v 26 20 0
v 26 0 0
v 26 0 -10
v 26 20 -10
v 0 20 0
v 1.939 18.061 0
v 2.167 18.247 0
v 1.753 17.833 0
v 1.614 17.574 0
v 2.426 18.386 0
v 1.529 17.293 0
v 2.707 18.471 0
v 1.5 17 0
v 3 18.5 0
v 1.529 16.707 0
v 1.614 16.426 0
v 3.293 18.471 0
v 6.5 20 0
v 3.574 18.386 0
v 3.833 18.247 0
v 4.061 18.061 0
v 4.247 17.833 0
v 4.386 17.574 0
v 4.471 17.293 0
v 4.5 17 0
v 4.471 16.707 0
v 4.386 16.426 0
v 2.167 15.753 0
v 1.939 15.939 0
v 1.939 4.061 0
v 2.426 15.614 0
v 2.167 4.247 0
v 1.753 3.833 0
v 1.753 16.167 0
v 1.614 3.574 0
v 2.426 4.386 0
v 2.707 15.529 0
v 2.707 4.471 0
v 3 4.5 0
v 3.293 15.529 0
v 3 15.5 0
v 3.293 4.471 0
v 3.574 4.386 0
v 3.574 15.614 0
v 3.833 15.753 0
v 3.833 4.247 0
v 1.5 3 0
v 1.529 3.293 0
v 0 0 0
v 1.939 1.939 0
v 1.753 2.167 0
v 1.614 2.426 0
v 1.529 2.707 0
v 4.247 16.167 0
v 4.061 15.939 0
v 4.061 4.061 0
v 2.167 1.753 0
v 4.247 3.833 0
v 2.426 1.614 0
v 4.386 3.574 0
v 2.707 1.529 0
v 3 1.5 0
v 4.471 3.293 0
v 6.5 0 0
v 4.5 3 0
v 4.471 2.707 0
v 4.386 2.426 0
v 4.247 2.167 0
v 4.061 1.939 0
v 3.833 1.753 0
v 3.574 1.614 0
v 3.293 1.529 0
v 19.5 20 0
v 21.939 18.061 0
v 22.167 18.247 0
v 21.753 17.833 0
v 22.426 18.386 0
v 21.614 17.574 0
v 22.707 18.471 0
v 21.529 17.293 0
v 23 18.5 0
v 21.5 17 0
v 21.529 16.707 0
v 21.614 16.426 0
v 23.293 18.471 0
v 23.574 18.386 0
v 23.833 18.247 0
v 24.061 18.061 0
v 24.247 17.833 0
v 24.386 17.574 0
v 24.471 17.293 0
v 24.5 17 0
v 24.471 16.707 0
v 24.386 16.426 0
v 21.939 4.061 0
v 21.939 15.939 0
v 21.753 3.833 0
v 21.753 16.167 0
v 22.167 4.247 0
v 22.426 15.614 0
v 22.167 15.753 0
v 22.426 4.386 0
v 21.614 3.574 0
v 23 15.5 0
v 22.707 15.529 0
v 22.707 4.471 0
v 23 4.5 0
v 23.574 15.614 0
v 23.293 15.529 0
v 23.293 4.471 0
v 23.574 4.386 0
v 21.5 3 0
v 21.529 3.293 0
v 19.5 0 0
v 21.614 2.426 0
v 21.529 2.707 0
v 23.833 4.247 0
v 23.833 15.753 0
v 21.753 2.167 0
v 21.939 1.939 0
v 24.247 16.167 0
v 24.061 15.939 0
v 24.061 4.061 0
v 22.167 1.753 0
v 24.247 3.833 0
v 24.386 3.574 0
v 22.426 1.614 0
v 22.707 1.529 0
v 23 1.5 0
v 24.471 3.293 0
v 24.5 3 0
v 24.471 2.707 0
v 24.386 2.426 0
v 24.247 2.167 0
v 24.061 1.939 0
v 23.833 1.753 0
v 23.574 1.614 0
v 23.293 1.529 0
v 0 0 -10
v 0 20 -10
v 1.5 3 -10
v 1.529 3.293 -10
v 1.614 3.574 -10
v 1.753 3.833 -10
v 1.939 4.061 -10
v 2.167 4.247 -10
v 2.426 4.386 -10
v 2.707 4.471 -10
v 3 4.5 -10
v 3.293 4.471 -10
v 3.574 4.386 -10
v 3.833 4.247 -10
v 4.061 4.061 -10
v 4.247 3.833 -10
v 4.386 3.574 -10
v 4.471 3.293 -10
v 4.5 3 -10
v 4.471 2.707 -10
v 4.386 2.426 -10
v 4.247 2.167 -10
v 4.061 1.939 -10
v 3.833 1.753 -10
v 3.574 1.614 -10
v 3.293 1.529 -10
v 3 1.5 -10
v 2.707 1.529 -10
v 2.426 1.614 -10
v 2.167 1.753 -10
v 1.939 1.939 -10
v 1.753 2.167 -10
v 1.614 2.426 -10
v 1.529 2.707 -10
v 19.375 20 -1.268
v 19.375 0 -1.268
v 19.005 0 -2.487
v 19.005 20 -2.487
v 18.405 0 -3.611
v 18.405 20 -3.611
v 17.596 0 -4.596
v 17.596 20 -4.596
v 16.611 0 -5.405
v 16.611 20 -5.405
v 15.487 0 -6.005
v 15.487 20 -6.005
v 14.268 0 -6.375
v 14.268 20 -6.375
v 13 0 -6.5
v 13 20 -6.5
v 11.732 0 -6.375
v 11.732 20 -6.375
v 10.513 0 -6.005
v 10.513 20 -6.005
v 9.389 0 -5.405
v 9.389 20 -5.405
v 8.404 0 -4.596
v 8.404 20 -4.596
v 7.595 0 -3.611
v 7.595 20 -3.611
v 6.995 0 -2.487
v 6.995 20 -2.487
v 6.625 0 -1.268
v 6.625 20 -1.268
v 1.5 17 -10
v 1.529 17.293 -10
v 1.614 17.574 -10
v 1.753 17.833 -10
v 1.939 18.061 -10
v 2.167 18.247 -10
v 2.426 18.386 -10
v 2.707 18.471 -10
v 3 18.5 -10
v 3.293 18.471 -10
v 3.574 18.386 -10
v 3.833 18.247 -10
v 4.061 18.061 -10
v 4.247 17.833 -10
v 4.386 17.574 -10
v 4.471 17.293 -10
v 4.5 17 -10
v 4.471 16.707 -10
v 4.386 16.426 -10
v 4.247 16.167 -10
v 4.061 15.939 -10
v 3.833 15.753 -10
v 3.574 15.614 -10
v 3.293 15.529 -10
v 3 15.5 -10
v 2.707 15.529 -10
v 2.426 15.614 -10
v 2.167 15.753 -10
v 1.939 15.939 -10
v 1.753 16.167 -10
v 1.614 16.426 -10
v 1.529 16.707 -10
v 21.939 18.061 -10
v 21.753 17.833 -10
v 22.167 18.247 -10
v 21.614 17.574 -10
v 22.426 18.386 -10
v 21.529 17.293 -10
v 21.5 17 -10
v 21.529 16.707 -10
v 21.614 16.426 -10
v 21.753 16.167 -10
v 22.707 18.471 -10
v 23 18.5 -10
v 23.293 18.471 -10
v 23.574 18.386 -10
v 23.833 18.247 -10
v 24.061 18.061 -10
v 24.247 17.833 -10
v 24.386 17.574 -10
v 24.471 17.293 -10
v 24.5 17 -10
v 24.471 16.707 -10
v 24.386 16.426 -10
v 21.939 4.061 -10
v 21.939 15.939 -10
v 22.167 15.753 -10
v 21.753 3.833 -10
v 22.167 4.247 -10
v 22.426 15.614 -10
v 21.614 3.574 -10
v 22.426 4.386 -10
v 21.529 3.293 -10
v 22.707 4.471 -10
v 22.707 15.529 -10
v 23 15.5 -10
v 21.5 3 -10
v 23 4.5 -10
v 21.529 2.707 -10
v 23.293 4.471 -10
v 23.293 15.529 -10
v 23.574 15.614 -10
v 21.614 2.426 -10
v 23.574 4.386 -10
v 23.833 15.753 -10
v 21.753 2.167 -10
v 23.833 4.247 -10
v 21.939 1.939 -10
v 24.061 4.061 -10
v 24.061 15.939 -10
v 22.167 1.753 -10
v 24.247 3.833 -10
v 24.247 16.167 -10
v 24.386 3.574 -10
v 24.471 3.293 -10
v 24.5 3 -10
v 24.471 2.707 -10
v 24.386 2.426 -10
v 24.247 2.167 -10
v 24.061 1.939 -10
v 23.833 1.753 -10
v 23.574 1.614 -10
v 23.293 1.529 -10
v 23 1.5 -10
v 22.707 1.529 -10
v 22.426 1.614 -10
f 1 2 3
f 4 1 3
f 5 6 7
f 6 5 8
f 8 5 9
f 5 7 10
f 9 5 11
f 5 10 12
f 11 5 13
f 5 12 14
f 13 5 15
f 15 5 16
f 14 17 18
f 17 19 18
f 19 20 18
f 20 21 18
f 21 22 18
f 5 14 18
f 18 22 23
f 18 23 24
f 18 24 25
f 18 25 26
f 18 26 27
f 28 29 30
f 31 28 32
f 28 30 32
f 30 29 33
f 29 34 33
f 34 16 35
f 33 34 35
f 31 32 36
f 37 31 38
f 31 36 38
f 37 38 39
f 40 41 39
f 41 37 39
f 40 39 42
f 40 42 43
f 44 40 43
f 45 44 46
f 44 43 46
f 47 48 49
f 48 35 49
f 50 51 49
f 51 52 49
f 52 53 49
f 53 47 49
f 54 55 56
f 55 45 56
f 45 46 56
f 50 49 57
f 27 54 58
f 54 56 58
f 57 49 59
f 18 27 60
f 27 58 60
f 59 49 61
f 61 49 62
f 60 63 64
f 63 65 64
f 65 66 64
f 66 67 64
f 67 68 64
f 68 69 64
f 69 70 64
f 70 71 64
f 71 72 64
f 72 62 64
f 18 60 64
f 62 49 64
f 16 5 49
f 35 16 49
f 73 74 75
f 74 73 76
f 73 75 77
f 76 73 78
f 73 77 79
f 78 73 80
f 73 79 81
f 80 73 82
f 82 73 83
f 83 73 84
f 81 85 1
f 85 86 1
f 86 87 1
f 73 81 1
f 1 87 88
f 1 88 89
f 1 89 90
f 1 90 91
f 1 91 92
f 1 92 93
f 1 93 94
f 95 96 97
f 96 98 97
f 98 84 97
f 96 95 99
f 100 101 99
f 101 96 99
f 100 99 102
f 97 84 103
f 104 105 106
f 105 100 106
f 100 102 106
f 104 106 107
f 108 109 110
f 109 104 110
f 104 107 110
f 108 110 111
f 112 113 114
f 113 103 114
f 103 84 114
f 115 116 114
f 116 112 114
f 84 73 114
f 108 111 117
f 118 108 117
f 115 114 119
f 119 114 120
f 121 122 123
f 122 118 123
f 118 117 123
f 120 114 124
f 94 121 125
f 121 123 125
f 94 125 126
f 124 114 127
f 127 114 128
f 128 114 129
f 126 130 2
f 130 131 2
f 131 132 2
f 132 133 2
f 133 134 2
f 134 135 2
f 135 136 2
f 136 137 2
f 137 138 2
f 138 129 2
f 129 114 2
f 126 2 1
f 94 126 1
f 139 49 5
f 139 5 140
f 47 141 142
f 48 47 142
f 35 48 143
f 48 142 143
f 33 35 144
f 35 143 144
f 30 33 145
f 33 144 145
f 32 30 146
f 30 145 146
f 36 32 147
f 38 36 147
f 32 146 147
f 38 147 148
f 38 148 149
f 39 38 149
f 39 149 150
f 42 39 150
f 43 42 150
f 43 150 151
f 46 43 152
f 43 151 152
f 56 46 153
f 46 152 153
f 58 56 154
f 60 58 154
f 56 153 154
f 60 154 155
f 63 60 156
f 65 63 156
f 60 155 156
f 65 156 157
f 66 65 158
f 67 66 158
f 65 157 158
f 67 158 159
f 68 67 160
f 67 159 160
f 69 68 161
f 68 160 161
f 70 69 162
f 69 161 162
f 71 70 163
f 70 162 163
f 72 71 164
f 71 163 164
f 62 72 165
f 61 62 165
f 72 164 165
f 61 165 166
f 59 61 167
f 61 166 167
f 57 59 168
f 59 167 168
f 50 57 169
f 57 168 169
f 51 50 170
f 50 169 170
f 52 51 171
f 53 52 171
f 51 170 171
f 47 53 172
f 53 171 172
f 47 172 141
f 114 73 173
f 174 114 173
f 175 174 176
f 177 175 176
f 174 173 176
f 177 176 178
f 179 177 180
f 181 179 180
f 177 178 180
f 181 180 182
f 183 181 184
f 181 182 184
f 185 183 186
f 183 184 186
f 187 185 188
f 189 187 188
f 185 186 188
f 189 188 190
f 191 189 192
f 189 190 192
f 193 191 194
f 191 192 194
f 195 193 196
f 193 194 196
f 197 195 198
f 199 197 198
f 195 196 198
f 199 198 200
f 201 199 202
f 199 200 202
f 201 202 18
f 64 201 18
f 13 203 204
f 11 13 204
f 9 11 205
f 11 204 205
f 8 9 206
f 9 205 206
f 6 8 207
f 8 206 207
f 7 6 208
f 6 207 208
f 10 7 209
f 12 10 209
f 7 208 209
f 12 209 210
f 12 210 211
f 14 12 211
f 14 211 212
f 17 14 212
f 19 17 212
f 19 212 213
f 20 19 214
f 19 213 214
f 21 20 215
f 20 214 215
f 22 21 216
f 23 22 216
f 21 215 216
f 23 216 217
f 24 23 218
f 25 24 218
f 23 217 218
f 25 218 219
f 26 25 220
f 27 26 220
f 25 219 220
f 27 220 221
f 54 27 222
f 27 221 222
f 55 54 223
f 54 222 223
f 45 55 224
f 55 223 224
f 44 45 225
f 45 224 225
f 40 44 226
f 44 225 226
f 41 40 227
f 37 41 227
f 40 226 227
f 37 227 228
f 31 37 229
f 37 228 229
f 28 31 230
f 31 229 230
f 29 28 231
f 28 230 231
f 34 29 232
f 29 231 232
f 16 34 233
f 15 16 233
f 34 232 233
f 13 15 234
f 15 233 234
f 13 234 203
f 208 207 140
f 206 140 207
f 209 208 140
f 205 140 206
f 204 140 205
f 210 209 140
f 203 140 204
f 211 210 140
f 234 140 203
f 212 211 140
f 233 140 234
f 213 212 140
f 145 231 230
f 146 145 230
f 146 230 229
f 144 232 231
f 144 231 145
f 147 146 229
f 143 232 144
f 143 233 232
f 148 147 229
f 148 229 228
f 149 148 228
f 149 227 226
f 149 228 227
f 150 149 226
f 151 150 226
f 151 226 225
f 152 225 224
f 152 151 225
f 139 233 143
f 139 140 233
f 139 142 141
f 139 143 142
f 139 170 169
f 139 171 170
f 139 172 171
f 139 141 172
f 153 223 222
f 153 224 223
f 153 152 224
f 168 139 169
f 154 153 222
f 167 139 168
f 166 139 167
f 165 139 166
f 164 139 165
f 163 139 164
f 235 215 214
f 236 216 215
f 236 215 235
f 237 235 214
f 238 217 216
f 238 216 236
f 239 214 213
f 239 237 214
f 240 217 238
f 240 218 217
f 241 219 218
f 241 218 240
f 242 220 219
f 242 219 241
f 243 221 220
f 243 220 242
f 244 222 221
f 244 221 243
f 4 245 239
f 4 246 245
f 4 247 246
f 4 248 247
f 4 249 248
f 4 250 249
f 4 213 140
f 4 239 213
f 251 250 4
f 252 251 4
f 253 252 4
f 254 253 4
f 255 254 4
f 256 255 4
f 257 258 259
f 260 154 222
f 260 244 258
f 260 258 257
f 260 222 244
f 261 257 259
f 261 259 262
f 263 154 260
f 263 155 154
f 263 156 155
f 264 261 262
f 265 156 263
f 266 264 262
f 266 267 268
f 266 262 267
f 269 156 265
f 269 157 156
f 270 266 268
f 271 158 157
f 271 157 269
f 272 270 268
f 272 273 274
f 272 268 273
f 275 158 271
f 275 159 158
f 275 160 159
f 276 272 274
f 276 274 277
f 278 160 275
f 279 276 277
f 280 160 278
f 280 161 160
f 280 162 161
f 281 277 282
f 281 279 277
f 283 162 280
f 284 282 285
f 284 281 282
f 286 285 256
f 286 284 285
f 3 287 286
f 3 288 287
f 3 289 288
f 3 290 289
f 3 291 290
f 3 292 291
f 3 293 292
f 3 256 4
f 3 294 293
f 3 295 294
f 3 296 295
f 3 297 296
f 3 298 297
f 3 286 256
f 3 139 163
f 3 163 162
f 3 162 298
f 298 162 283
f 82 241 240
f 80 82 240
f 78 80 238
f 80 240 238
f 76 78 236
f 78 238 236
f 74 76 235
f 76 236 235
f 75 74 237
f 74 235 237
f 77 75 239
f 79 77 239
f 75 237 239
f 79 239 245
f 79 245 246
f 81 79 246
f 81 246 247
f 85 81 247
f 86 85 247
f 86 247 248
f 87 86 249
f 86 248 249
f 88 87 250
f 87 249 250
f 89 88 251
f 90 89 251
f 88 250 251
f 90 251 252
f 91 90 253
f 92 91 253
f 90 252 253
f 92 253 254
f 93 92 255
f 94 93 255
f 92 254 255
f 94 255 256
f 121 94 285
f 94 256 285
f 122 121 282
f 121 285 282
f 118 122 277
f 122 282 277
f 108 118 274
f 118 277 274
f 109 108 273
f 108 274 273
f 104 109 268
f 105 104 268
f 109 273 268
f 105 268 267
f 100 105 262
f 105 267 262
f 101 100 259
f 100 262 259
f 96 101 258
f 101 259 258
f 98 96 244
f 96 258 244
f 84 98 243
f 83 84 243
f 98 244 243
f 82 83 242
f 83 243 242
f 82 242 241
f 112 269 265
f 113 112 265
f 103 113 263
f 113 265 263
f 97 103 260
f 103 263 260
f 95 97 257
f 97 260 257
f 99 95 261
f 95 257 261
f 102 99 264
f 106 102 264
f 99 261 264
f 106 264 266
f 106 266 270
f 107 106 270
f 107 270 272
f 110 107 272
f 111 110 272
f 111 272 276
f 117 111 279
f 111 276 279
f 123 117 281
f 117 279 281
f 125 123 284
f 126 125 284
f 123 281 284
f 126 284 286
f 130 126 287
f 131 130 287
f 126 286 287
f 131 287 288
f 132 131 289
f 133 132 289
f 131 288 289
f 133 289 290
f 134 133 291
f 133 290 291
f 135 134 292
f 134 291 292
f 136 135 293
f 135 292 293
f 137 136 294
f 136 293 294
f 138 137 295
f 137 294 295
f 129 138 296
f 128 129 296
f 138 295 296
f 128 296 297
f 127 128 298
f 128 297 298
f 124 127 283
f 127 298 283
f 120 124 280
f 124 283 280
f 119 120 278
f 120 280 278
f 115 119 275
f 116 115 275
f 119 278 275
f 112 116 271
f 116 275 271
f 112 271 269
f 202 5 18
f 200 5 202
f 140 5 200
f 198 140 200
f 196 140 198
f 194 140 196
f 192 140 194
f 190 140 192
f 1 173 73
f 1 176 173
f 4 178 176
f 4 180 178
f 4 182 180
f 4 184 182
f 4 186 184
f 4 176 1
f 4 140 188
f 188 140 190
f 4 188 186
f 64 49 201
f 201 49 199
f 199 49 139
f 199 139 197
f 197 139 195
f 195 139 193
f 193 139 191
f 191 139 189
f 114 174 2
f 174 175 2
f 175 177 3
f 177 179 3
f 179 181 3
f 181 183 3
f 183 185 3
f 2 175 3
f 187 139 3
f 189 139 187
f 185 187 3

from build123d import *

# Parameters (mm, degrees)
SKETCH1_W           = 26
SKETCH1_H           = 10
BOSS_EXTRUDE1_DEPTH = 20
CUT_EXTRUDE1_DEPTH  = 21
SKETCH3_R           = 1.5
CUT_EXTRUDE2_DEPTH  = 10


with BuildPart() as part:
    # Sketch1 → Boss-Extrude1 (new body)
    with BuildSketch(Plane(origin=(0, 0, 0), x_dir=(1, 0, 0), z_dir=(0, 1, 0))):
        with Locations((13, 5)):
            Rectangle(SKETCH1_W, SKETCH1_H)
    extrude(amount=BOSS_EXTRUDE1_DEPTH)

    # Sketch2 → Cut-Extrude1 (cut, through all)
    with BuildSketch(Plane(origin=(0, 20, 0), x_dir=(1, 0, 0), z_dir=(0, 1, 0))):
        with BuildLine():
            Line((6.5, 0), (19.5, 0))
            ThreePointArc((19.5, 0), (13, 6.5), (6.5, 0))
        make_face()
    extrude(amount=-CUT_EXTRUDE1_DEPTH, mode=Mode.SUBTRACT)

    # Sketch3 → Cut-Extrude2 (cut)
    with BuildSketch(Plane(origin=(0, 0, -10), x_dir=(-1, 0, 0), z_dir=(0, 0, -1))):
        with Locations((-23, 17)):
            Circle(SKETCH3_R)
        with Locations((-3, 17)):
            Circle(SKETCH3_R)
        with Locations((-3, 3)):
            Circle(SKETCH3_R)
        with Locations((-23, 3)):
            Circle(SKETCH3_R)
    extrude(amount=-CUT_EXTRUDE2_DEPTH, mode=Mode.SUBTRACT)


solid = part.part
